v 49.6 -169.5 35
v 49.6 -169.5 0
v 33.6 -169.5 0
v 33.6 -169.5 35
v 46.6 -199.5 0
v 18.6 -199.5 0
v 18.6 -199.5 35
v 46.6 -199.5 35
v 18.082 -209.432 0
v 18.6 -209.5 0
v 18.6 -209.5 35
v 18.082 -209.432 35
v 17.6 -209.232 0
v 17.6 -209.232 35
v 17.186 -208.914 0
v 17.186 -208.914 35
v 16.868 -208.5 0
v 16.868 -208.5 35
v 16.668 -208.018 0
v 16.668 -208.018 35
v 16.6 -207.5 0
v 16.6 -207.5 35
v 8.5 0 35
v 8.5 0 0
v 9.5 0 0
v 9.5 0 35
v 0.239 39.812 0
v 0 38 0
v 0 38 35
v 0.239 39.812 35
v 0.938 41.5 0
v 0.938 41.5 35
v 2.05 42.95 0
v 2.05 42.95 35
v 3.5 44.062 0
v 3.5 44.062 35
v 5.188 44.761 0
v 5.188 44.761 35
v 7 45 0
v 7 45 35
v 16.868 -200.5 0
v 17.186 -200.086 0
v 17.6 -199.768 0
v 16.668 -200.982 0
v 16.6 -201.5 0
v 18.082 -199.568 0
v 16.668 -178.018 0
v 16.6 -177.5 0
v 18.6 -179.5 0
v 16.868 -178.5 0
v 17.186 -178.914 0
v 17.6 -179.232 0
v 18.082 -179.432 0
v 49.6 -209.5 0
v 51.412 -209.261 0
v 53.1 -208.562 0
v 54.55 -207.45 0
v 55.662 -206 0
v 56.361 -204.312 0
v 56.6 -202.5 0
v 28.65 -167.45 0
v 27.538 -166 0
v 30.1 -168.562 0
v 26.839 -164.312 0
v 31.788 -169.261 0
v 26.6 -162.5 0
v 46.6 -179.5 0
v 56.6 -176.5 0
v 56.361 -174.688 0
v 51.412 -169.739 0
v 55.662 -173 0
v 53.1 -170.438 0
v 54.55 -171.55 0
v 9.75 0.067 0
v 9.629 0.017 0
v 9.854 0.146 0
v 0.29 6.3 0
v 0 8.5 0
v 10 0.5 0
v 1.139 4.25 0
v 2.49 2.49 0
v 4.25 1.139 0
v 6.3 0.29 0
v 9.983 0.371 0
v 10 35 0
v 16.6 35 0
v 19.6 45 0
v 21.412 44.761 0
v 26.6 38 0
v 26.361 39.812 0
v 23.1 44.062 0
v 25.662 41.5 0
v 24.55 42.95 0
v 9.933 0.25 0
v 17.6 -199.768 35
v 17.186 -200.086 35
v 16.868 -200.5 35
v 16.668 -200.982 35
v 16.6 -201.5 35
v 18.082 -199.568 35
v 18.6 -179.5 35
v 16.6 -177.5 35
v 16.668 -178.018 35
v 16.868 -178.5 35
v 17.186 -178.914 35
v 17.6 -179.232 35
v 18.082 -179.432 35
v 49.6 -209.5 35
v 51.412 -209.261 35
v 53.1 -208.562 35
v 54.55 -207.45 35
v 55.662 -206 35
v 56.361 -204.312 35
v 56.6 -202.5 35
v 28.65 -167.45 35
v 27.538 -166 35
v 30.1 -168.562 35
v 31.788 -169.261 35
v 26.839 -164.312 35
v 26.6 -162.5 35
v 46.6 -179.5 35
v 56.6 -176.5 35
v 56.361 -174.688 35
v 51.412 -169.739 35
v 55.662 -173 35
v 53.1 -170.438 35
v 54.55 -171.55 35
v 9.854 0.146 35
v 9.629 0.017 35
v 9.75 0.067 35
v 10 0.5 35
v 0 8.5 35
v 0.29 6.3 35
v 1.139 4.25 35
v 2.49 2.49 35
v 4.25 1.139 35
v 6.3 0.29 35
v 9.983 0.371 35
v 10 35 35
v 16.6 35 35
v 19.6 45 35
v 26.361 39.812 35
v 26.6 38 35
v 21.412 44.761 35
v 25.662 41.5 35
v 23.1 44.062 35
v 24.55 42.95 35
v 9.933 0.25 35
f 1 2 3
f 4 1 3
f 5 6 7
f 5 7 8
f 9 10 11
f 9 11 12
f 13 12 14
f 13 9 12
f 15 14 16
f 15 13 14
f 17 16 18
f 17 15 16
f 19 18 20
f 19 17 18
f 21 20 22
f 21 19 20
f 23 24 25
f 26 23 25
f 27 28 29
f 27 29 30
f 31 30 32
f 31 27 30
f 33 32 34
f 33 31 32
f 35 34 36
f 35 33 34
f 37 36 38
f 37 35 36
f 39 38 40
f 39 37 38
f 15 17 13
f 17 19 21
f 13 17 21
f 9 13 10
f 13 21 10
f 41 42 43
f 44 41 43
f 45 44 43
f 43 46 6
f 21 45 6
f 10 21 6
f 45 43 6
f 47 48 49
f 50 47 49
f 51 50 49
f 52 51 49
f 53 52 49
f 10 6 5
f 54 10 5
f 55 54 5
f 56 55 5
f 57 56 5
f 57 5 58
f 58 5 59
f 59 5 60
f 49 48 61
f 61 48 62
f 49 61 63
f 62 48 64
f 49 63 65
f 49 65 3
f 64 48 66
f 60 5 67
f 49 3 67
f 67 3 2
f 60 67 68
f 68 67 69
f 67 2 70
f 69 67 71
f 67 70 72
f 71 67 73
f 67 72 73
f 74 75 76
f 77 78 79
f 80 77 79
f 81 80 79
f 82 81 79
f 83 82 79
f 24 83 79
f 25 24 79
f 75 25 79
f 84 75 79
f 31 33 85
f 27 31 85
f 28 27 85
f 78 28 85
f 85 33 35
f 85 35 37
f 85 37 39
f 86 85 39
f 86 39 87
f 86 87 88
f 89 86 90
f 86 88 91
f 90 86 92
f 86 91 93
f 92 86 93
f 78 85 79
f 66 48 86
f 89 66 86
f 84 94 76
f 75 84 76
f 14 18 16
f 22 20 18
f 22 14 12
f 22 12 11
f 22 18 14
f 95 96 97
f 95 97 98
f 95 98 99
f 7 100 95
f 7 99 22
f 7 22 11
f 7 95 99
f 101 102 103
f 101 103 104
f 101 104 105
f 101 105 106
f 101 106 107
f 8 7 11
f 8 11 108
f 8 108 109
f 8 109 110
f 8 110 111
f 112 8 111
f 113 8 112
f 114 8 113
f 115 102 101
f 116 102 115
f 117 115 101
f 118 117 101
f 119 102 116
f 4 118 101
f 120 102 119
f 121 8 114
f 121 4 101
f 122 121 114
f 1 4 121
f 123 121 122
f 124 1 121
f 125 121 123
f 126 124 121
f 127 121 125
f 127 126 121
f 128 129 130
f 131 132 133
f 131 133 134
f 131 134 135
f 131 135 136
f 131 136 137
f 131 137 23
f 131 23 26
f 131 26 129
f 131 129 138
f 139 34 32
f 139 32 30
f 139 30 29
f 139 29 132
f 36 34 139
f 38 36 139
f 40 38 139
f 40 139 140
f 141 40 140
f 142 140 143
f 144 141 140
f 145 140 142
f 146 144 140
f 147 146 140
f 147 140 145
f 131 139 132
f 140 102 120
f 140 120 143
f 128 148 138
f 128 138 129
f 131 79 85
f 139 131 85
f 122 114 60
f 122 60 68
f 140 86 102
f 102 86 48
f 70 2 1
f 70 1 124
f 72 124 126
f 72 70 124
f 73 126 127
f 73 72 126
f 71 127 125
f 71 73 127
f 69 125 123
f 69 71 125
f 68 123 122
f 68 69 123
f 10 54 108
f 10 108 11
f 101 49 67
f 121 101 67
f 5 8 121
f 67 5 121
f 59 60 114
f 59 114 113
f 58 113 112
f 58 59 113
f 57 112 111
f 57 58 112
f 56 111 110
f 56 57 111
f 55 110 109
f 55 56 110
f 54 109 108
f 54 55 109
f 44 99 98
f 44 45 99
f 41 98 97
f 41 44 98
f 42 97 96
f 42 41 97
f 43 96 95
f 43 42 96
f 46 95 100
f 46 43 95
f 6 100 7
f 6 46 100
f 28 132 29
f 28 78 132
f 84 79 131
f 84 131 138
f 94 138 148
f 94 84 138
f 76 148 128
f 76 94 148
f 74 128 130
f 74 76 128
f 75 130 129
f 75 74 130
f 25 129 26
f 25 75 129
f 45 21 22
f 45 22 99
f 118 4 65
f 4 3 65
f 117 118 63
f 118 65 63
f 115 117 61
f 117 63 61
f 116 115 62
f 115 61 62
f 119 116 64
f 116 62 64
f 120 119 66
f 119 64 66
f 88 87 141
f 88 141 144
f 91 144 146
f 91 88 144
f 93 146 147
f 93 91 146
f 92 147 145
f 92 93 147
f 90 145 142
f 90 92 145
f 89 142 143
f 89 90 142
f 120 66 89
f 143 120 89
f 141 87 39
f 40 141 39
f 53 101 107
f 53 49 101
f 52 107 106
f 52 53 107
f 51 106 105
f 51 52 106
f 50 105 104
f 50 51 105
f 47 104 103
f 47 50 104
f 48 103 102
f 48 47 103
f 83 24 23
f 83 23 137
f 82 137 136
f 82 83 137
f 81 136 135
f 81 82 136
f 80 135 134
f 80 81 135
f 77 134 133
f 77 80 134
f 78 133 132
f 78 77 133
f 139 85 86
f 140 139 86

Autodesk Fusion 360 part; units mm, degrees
sketch "Sketch1" plane through (0, 0, 0) normal (0, 0, 1) x (1, 0, 0)
  line L0 (0, 8.5) -> (0, 38)
  line L1 (8.5, 0) -> (9.5, 0)
  line L2 (10, 0.5) -> (10, 35)
  line L3 (10, 35) -> (16.6, 35)
  line L4 (16.6, 35) -> (16.6, -177.5)
  line L5 (18.6, -179.5) -> (26.6, -179.5)
  line L6 (26.6, -162.5) -> (26.6, 38)
  line L7 (19.6, 45) -> (7, 45)
  line L8 (26.6, -179.5) -> (56.6, -179.5)
  line L9 (56.6, -179.5) -> (56.6, -176.5)
  line L10 (49.6, -169.5) -> (33.6, -169.5)
  line L11 (56.6, -179.5) -> (56.6, -202.5)
  line L12 (49.6, -209.5) -> (46.6, -209.5)
  line L13 (46.6, -209.5) -> (46.6, -179.5)
  line L14 (46.6, -209.5) -> (18.6, -209.5)
  line L15 (16.6, -207.5) -> (16.6, -201.5)
  line L16 (18.6, -199.5) -> (46.6, -199.5)
  arc A0 (0, 8.5) -> (8.5, 0) centre (8.5, 8.5) ccw
  arc A1 (9.5, 0) -> (10, 0.5) centre (9.5, 0.5) ccw
  arc A2 (7, 45) -> (0, 38) centre (7, 38) ccw
  arc A3 (26.6, 38) -> (19.6, 45) centre (19.6, 38) ccw
  arc A4 (16.6, -177.5) -> (18.6, -179.5) centre (18.6, -177.5) ccw
  arc A5 (18.6, -199.5) -> (16.6, -201.5) centre (18.6, -201.5) ccw
  arc A6 (16.6, -207.5) -> (18.6, -209.5) centre (18.6, -207.5) ccw
  arc A7 (56.6, -176.5) -> (49.6, -169.5) centre (49.6, -176.5) ccw
  arc A8 (49.6, -209.5) -> (56.6, -202.5) centre (49.6, -202.5) ccw
  arc A9 (26.6, -162.5) -> (33.6, -169.5) centre (33.6, -162.5) ccw
  point P0 (0, 45)
  point P1 (10, 0)
  point P2 (16.6, -179.5)
  point P3 (56.6, -169.5)
  point P4 (56.6, -209.5)
  point P5 (16.6, -209.5)
  point P6 (16.6, -199.5)
  dimension "d1" = 45
  dimension "d2" = 10
  dimension "d3" = 35
  dimension "d4" = 6.6
  dimension "d5" = 10
  dimension "d6" = 214.5
  dimension "d7" = 30
  dimension "d8" = 10
  dimension "d9" = 30
  dimension "d10" = 10
  dimension "d11" = 30
  dimension "d12" = 10
  dimension "d13" = 8.5
  dimension "d14" = 0.5
  dimension "d15" = 7
  dimension "d16" = 7
  dimension "d17" = 2
  dimension "d18" = 2
  dimension "d19" = 2
  dimension "d20" = 7
  dimension "d21" = 7
  dimension "d22" = 7
extrude "Extrude1" add sketch "Sketch1" along normal blind 35
